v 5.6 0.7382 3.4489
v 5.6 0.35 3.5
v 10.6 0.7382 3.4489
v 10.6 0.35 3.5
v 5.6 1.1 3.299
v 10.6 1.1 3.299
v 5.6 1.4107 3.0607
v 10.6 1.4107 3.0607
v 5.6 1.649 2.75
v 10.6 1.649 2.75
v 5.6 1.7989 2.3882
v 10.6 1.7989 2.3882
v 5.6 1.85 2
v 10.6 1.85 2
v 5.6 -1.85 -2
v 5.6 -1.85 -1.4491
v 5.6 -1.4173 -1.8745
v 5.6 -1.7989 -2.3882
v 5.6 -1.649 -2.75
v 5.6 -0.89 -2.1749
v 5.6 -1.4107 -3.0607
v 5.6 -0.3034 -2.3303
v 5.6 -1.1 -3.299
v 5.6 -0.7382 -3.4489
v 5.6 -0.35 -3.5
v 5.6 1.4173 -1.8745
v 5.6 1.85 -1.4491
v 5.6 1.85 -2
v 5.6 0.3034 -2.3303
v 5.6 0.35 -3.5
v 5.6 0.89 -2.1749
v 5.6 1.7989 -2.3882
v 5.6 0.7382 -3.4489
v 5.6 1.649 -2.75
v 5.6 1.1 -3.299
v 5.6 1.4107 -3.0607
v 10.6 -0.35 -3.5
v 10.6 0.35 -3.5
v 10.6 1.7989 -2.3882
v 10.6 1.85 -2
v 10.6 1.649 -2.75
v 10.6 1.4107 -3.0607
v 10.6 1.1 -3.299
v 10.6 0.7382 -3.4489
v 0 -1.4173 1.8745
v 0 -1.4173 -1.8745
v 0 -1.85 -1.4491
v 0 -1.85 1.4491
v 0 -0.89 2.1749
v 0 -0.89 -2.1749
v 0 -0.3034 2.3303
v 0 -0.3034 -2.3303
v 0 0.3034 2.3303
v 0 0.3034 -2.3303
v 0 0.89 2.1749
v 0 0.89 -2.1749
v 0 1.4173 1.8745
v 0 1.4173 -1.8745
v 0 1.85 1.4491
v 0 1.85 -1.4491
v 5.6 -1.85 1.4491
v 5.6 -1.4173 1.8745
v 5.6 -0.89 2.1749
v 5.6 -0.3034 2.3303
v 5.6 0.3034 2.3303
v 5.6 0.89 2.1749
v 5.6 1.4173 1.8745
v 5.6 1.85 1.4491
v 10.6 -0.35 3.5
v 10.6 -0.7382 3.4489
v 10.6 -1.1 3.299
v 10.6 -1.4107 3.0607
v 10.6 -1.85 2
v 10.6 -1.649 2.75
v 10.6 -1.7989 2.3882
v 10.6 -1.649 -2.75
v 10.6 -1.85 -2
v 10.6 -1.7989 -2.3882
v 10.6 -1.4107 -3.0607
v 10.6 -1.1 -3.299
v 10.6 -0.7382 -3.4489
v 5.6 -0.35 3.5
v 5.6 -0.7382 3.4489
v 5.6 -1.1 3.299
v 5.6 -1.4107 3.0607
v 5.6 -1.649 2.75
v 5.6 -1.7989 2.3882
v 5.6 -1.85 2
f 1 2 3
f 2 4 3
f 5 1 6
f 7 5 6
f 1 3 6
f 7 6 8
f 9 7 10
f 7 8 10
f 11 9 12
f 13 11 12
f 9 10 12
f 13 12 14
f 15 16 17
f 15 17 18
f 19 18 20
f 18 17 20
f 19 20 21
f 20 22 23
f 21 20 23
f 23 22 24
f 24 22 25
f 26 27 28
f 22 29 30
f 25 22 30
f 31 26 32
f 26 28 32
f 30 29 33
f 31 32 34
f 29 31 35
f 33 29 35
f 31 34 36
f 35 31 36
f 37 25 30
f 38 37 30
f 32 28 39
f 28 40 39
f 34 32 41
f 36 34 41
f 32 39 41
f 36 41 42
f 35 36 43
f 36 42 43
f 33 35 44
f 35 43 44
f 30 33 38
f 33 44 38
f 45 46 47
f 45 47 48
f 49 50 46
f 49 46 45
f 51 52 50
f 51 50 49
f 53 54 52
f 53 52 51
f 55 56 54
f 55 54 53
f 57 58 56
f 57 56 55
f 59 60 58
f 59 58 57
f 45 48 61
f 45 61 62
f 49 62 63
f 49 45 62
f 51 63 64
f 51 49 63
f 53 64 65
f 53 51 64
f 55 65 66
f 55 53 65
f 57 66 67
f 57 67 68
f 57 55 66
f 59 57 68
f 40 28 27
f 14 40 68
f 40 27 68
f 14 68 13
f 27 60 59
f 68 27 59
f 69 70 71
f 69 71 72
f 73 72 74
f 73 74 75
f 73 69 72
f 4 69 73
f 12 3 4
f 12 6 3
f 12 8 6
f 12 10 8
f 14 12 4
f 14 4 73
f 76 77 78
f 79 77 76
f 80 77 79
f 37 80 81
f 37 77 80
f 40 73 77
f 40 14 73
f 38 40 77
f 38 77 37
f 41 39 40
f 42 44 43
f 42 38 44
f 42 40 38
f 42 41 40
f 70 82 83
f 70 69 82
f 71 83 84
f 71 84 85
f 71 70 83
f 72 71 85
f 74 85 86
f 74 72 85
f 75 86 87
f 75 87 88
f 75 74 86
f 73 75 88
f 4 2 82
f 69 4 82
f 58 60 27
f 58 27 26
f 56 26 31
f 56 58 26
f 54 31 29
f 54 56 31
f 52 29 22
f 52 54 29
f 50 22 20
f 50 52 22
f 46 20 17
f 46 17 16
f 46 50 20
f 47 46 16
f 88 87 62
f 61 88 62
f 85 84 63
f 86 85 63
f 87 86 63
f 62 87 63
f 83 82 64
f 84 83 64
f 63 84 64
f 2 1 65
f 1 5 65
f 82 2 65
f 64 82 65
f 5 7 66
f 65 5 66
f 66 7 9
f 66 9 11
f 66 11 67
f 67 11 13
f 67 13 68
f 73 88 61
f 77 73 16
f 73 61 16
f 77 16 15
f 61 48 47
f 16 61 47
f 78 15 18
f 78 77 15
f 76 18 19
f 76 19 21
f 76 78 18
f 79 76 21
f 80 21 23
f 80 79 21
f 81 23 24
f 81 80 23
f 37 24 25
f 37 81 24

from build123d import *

# Parameters (mm, degrees)
BOSS_EXTRUDE1_DEPTH = 5.6
BOSS_EXTRUDE2_DEPTH = 5
FILLET1_R           = 1.5


with BuildPart() as part:
    # Sketch1 → Boss-Extrude1 (new body)
    with BuildSketch(Plane(origin=(0, 0, 0), x_dir=(0, 0, -1), z_dir=(1, 0, 0))):
        with BuildLine():
            Line((-1.449137675, 1.85), (1.449137675, 1.85))
            ThreePointArc((1.449137675, 1.85), (2.35, 0), (1.449137675, -1.85))
            Line((1.449137675, -1.85), (-1.449137675, -1.85))
            ThreePointArc((-1.449137675, -1.85), (-2.35, 0), (-1.449137675, 1.85))
        make_face()
    extrude(amount=BOSS_EXTRUDE1_DEPTH)

    # Sketch2 → Boss-Extrude2 (add)
    with BuildSketch(Plane(origin=(5.6, 0, 0), x_dir=(0, 0, -1), z_dir=(1, 0, 0))):
        Polygon((0, 1.85), (-3.5, 1.85), (-3.5, -1.85), (-1.449137675, -1.85), (1.449137675, -1.85), (3.5, -1.85), (3.5, 1.85), align=None)
    extrude(amount=BOSS_EXTRUDE2_DEPTH)

    # Fillet1
    fillet1_edges = [part.edges().sort_by_distance(p)[0] for p in [
        (8.1, -1.85, -3.5),
        (8.1, 1.85, -3.5),
        (8.1, -1.85, 3.5),
        (8.1, 1.85, 3.5),
    ]]
    fillet(fillet1_edges, radius=FILLET1_R)


solid = part.part
